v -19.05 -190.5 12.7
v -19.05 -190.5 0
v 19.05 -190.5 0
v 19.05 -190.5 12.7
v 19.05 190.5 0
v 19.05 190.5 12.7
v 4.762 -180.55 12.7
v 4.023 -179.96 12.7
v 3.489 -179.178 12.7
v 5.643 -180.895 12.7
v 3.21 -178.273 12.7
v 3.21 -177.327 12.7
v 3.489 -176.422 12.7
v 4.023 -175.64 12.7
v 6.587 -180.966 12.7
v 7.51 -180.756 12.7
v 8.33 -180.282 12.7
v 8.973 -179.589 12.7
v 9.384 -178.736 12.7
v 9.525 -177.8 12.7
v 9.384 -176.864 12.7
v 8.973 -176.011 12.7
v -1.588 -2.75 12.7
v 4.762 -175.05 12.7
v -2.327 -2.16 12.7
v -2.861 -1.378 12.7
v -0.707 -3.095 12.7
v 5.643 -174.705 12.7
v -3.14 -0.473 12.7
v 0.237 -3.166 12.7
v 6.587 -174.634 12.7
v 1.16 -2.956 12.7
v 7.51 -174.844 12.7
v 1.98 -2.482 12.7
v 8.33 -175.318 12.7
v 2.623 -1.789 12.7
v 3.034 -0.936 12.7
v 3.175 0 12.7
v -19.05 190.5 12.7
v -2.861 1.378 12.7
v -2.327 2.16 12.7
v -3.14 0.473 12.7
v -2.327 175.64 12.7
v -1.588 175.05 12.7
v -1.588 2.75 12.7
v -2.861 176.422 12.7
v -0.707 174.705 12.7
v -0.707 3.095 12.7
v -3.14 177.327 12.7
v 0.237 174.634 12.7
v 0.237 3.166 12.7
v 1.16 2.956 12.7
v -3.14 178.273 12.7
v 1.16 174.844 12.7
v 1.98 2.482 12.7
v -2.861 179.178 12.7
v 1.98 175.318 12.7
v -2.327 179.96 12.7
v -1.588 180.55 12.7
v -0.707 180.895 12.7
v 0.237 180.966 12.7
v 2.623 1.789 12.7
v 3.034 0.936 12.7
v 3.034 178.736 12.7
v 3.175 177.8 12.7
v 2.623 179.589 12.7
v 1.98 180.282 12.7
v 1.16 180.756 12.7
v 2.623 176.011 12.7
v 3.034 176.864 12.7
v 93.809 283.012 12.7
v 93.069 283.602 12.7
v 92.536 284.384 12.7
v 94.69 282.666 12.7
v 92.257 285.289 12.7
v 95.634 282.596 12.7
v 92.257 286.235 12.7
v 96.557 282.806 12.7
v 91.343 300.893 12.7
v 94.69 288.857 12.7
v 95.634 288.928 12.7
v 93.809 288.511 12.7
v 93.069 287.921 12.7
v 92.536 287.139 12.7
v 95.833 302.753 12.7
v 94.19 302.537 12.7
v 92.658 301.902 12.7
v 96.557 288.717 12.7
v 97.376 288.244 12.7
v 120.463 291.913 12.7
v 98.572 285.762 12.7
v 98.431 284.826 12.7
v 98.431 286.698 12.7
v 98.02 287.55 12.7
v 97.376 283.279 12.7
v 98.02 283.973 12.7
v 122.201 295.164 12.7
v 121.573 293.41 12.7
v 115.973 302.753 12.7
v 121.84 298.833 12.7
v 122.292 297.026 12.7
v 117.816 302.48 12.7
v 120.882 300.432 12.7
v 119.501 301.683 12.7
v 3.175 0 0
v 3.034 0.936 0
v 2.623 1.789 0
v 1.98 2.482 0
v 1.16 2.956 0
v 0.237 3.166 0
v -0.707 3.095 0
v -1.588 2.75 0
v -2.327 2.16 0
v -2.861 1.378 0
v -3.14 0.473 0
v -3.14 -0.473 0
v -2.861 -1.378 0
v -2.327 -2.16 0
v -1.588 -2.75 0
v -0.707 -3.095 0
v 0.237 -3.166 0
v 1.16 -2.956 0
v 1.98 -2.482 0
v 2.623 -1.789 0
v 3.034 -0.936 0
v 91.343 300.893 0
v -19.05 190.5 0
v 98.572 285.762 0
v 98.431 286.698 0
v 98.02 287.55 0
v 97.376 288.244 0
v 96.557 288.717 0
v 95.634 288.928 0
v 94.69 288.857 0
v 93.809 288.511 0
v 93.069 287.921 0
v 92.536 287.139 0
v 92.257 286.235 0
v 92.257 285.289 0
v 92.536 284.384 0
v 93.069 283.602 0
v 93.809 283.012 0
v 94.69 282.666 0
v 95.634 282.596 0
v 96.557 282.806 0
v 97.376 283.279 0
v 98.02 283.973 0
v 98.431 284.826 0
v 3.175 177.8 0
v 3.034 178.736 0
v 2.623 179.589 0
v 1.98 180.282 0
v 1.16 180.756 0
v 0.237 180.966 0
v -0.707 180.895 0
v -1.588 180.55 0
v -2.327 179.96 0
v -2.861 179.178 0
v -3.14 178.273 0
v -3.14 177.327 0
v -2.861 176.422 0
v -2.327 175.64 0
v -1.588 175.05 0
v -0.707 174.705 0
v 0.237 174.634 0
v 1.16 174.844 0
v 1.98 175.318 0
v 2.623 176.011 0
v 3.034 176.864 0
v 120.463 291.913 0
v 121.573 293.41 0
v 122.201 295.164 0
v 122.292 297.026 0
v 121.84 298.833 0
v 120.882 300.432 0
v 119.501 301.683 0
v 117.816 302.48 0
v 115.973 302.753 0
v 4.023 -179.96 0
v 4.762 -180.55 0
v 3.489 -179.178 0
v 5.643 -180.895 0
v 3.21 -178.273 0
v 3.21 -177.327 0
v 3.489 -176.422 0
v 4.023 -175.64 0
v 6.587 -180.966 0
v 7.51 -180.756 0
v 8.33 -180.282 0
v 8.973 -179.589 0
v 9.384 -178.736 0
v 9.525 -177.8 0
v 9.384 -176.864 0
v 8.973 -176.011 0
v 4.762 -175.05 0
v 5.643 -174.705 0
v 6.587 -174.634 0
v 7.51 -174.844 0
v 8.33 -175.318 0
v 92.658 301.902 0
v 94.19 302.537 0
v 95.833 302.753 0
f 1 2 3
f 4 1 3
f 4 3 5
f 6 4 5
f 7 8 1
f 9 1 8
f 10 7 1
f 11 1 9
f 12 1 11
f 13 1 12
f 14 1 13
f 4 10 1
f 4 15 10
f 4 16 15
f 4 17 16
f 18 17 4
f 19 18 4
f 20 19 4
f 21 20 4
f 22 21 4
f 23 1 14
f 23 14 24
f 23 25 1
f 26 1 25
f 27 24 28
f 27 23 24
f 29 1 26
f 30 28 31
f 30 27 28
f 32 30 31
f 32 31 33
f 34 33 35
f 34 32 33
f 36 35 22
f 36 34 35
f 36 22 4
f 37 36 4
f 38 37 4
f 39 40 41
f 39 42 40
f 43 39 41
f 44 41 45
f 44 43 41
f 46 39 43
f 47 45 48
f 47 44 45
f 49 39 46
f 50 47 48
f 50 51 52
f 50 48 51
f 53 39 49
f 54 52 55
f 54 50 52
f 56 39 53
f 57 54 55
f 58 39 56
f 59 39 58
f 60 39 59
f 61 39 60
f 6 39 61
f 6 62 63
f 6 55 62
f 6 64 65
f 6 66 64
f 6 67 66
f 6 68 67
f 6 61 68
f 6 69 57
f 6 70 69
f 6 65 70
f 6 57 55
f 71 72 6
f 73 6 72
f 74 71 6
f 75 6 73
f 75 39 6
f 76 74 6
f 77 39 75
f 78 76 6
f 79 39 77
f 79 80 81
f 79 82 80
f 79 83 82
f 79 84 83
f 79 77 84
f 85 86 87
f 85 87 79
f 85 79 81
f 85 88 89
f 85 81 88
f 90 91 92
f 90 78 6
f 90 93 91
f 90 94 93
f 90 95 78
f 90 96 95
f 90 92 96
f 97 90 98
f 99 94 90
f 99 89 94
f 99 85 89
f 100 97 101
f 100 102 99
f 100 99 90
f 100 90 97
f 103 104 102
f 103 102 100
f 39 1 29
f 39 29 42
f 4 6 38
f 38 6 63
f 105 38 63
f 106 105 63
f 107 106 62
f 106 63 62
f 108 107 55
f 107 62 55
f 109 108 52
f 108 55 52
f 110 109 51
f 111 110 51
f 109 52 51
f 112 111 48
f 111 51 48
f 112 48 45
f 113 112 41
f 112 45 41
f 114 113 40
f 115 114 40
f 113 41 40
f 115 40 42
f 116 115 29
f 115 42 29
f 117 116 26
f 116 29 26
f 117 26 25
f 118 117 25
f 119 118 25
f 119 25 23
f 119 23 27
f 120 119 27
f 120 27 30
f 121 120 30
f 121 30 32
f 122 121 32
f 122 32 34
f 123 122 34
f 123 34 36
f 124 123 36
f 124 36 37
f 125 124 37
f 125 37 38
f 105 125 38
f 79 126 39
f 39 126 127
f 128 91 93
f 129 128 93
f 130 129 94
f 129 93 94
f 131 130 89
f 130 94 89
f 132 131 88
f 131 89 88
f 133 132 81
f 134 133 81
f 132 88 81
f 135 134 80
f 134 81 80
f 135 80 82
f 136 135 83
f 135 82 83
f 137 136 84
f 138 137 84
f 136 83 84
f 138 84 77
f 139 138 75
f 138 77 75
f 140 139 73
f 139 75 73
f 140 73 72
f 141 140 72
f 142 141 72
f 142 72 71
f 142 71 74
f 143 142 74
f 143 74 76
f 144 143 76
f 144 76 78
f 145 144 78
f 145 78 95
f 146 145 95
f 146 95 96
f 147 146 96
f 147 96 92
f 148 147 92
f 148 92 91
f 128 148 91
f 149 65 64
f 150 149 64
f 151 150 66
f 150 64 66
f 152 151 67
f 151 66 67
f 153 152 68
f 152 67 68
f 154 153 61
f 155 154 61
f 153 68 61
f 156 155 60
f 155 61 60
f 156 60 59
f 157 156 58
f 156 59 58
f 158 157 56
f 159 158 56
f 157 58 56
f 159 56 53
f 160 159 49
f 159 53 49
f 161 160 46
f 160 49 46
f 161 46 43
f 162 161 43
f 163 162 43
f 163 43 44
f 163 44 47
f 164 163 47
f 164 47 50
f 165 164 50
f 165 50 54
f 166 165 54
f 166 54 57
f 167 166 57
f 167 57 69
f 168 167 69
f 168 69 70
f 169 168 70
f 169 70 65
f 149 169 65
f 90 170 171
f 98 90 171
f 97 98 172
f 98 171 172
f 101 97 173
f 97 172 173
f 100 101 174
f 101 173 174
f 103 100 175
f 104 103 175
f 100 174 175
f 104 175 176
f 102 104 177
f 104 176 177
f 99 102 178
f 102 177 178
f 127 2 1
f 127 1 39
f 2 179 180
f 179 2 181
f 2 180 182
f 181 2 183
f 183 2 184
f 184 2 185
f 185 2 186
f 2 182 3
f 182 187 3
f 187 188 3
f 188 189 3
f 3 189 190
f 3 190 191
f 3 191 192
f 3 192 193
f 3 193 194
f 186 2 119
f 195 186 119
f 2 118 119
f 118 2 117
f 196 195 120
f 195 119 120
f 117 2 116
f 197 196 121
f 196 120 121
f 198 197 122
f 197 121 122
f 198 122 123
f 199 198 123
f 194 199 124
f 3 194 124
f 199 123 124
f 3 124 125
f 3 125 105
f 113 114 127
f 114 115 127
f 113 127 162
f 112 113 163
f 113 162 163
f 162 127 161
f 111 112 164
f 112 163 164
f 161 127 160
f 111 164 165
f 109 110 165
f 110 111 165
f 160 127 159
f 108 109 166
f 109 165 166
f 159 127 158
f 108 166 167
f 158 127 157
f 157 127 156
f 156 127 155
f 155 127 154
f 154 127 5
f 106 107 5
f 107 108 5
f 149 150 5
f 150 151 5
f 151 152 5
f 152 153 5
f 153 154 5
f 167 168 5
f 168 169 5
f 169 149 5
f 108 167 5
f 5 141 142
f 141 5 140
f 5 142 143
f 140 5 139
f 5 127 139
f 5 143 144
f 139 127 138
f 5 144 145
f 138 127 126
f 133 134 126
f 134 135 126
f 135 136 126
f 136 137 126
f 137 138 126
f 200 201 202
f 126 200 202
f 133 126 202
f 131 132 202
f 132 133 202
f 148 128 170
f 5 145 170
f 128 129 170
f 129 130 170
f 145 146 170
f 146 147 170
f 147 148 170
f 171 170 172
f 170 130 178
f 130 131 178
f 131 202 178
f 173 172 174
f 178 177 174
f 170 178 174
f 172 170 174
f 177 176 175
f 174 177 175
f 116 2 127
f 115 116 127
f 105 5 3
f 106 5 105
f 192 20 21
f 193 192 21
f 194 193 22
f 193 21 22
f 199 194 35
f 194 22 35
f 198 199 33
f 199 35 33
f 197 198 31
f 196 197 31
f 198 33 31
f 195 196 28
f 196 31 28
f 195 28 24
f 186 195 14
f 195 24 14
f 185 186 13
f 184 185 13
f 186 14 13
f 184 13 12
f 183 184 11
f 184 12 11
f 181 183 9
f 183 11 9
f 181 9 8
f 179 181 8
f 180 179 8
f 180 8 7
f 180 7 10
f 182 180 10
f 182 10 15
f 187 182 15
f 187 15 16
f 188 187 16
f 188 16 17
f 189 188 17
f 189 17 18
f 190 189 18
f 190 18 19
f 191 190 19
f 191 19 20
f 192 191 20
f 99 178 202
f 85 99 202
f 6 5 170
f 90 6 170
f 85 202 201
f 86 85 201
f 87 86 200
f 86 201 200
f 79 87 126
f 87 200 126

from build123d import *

# Parameters (mm, degrees)
SKETCH1_W           = 38.1
SKETCH1_H           = 381
BOSS_EXTRUDE2_DEPTH = 12.7
SKETCH3_R           = 3.175
CUT_EXTRUDE3_DEPTH  = 863.6
SKETCH4_R           = 3.175
CUT_EXTRUDE4_DEPTH  = 36
SKETCH2_R           = 3.175
CUT_EXTRUDE5_DEPTH  = 52.578
SKETCH5_R           = 3.175
CUT_EXTRUDE6_DEPTH  = 148.082


with BuildPart() as part:
    # Sketch1 → Boss-Extrude2 (new body)
    with BuildSketch(Plane.XY):
        Rectangle(SKETCH1_W, SKETCH1_H)
        with BuildLine():
            Line((19.05, 190.5), (120.463073453, 291.913073453))
            ThreePointArc((120.463073453, 291.913073453), (121.839580424, 298.833241309), (115.972945392, 302.753201513))
            Line((115.972945392, 302.753201513), (95.833457634, 302.753201513))
            ThreePointArc((95.833457634, 302.753201513), (93.403417839, 302.269836545), (91.343329574, 300.893329574))
            Line((91.343329574, 300.893329574), (-19.05, 190.5))
            Line((-19.05, 190.5), (19.05, 190.5))
        make_face()
    extrude(amount=BOSS_EXTRUDE2_DEPTH)

    # Sketch3 → Cut-Extrude3 (cut)
    with BuildSketch(Plane.XY.offset(12.7)):
        with Locations((95.396679576, 285.76176863)):
            Circle(SKETCH3_R)
    extrude(amount=-CUT_EXTRUDE3_DEPTH, mode=Mode.SUBTRACT)

    # Sketch4 → Cut-Extrude4 (cut)
    with BuildSketch(Plane.XY.offset(12.7)):
        Circle(SKETCH4_R)
    extrude(amount=-CUT_EXTRUDE4_DEPTH, mode=Mode.SUBTRACT)

    # Sketch2 → Cut-Extrude5 (cut)
    with BuildSketch(Plane.XY.offset(12.7)):
        with Locations((6.35, -177.8)):
            Circle(SKETCH2_R)
    extrude(amount=-CUT_EXTRUDE5_DEPTH, mode=Mode.SUBTRACT)

    # Sketch5 → Cut-Extrude6 (cut)
    with BuildSketch(Plane.XY.offset(12.7)):
        with Locations((0, 177.8)):
            Circle(SKETCH5_R)
    extrude(amount=-CUT_EXTRUDE6_DEPTH, mode=Mode.SUBTRACT)


solid = part.part
